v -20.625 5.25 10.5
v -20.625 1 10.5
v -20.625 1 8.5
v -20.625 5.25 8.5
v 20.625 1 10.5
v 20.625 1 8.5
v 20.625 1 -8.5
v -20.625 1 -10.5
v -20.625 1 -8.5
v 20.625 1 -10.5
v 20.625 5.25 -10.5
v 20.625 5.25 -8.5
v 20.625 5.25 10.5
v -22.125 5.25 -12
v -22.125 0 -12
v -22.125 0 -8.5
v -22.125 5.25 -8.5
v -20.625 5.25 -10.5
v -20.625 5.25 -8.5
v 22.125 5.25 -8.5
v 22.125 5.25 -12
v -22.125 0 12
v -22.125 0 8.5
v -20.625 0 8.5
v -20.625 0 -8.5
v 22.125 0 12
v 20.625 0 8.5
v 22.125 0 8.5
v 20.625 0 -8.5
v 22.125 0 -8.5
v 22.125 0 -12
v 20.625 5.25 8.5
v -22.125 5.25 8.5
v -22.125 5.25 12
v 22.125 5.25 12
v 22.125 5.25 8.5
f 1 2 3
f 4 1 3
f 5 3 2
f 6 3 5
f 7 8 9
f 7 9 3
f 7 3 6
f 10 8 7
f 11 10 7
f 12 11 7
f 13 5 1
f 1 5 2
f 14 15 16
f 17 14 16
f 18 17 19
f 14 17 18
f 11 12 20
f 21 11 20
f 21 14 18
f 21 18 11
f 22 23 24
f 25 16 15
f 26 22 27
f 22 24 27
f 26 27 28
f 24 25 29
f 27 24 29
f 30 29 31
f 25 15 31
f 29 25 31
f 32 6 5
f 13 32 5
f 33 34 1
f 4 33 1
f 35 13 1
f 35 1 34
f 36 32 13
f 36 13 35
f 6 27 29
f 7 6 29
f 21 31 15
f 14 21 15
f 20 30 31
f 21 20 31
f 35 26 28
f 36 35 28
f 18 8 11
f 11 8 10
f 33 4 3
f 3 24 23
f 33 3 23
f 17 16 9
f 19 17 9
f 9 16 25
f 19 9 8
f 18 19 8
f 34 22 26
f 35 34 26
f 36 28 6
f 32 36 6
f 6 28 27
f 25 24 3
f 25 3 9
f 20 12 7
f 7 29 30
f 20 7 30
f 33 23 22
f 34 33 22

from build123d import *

# Parameters (mm, degrees)
BOSS_EXTRUDE1_DEPTH   = 5.25
BOSS_EXTRUDE1_2_DEPTH = 5.25
SKETCH1_2_W           = 41.25
SKETCH1_2_H           = 21
BOSS_EXTRUDE2_DEPTH   = 1


with BuildPart() as part:
    # Sketch1 → Boss-Extrude1 (new body)
    with BuildSketch(Plane(origin=(0, 0, 0), x_dir=(1, 0, 0), z_dir=(0, 1, 0))):
        Polygon((-22.125, 12), (-22.125, 8.5), (-20.625, 8.5), (-20.625, 10.5), (20.625, 10.5), (20.625, 8.5), (22.125, 8.5), (22.125, 12), align=None)
    extrude(amount=BOSS_EXTRUDE1_DEPTH)



with BuildPart() as body_2:
    # Sketch1 → Boss-Extrude1 2 (new body)
    with BuildSketch(Plane(origin=(0, 0, 0), x_dir=(1, 0, 0), z_dir=(0, 1, 0))):
        Polygon((-20.625, -8.5), (-22.125, -8.5), (-22.125, -12), (22.125, -12), (22.125, -8.5), (20.625, -8.5), (20.625, -10.5), (-20.625, -10.5), align=None)
    extrude(amount=BOSS_EXTRUDE1_2_DEPTH)


with BuildPart() as part_1:
    add(part.part)

    add(body_2.part)  # Boss-Extrude2 merges body 2
    # Sketch1<2> → Boss-Extrude2 (add)
    with BuildSketch(Plane(origin=(0, 0, 0), x_dir=(1, 0, 0), z_dir=(0, 1, 0))):
        Rectangle(SKETCH1_2_W, SKETCH1_2_H)
    extrude(amount=BOSS_EXTRUDE2_DEPTH)


solid = part_1.part
